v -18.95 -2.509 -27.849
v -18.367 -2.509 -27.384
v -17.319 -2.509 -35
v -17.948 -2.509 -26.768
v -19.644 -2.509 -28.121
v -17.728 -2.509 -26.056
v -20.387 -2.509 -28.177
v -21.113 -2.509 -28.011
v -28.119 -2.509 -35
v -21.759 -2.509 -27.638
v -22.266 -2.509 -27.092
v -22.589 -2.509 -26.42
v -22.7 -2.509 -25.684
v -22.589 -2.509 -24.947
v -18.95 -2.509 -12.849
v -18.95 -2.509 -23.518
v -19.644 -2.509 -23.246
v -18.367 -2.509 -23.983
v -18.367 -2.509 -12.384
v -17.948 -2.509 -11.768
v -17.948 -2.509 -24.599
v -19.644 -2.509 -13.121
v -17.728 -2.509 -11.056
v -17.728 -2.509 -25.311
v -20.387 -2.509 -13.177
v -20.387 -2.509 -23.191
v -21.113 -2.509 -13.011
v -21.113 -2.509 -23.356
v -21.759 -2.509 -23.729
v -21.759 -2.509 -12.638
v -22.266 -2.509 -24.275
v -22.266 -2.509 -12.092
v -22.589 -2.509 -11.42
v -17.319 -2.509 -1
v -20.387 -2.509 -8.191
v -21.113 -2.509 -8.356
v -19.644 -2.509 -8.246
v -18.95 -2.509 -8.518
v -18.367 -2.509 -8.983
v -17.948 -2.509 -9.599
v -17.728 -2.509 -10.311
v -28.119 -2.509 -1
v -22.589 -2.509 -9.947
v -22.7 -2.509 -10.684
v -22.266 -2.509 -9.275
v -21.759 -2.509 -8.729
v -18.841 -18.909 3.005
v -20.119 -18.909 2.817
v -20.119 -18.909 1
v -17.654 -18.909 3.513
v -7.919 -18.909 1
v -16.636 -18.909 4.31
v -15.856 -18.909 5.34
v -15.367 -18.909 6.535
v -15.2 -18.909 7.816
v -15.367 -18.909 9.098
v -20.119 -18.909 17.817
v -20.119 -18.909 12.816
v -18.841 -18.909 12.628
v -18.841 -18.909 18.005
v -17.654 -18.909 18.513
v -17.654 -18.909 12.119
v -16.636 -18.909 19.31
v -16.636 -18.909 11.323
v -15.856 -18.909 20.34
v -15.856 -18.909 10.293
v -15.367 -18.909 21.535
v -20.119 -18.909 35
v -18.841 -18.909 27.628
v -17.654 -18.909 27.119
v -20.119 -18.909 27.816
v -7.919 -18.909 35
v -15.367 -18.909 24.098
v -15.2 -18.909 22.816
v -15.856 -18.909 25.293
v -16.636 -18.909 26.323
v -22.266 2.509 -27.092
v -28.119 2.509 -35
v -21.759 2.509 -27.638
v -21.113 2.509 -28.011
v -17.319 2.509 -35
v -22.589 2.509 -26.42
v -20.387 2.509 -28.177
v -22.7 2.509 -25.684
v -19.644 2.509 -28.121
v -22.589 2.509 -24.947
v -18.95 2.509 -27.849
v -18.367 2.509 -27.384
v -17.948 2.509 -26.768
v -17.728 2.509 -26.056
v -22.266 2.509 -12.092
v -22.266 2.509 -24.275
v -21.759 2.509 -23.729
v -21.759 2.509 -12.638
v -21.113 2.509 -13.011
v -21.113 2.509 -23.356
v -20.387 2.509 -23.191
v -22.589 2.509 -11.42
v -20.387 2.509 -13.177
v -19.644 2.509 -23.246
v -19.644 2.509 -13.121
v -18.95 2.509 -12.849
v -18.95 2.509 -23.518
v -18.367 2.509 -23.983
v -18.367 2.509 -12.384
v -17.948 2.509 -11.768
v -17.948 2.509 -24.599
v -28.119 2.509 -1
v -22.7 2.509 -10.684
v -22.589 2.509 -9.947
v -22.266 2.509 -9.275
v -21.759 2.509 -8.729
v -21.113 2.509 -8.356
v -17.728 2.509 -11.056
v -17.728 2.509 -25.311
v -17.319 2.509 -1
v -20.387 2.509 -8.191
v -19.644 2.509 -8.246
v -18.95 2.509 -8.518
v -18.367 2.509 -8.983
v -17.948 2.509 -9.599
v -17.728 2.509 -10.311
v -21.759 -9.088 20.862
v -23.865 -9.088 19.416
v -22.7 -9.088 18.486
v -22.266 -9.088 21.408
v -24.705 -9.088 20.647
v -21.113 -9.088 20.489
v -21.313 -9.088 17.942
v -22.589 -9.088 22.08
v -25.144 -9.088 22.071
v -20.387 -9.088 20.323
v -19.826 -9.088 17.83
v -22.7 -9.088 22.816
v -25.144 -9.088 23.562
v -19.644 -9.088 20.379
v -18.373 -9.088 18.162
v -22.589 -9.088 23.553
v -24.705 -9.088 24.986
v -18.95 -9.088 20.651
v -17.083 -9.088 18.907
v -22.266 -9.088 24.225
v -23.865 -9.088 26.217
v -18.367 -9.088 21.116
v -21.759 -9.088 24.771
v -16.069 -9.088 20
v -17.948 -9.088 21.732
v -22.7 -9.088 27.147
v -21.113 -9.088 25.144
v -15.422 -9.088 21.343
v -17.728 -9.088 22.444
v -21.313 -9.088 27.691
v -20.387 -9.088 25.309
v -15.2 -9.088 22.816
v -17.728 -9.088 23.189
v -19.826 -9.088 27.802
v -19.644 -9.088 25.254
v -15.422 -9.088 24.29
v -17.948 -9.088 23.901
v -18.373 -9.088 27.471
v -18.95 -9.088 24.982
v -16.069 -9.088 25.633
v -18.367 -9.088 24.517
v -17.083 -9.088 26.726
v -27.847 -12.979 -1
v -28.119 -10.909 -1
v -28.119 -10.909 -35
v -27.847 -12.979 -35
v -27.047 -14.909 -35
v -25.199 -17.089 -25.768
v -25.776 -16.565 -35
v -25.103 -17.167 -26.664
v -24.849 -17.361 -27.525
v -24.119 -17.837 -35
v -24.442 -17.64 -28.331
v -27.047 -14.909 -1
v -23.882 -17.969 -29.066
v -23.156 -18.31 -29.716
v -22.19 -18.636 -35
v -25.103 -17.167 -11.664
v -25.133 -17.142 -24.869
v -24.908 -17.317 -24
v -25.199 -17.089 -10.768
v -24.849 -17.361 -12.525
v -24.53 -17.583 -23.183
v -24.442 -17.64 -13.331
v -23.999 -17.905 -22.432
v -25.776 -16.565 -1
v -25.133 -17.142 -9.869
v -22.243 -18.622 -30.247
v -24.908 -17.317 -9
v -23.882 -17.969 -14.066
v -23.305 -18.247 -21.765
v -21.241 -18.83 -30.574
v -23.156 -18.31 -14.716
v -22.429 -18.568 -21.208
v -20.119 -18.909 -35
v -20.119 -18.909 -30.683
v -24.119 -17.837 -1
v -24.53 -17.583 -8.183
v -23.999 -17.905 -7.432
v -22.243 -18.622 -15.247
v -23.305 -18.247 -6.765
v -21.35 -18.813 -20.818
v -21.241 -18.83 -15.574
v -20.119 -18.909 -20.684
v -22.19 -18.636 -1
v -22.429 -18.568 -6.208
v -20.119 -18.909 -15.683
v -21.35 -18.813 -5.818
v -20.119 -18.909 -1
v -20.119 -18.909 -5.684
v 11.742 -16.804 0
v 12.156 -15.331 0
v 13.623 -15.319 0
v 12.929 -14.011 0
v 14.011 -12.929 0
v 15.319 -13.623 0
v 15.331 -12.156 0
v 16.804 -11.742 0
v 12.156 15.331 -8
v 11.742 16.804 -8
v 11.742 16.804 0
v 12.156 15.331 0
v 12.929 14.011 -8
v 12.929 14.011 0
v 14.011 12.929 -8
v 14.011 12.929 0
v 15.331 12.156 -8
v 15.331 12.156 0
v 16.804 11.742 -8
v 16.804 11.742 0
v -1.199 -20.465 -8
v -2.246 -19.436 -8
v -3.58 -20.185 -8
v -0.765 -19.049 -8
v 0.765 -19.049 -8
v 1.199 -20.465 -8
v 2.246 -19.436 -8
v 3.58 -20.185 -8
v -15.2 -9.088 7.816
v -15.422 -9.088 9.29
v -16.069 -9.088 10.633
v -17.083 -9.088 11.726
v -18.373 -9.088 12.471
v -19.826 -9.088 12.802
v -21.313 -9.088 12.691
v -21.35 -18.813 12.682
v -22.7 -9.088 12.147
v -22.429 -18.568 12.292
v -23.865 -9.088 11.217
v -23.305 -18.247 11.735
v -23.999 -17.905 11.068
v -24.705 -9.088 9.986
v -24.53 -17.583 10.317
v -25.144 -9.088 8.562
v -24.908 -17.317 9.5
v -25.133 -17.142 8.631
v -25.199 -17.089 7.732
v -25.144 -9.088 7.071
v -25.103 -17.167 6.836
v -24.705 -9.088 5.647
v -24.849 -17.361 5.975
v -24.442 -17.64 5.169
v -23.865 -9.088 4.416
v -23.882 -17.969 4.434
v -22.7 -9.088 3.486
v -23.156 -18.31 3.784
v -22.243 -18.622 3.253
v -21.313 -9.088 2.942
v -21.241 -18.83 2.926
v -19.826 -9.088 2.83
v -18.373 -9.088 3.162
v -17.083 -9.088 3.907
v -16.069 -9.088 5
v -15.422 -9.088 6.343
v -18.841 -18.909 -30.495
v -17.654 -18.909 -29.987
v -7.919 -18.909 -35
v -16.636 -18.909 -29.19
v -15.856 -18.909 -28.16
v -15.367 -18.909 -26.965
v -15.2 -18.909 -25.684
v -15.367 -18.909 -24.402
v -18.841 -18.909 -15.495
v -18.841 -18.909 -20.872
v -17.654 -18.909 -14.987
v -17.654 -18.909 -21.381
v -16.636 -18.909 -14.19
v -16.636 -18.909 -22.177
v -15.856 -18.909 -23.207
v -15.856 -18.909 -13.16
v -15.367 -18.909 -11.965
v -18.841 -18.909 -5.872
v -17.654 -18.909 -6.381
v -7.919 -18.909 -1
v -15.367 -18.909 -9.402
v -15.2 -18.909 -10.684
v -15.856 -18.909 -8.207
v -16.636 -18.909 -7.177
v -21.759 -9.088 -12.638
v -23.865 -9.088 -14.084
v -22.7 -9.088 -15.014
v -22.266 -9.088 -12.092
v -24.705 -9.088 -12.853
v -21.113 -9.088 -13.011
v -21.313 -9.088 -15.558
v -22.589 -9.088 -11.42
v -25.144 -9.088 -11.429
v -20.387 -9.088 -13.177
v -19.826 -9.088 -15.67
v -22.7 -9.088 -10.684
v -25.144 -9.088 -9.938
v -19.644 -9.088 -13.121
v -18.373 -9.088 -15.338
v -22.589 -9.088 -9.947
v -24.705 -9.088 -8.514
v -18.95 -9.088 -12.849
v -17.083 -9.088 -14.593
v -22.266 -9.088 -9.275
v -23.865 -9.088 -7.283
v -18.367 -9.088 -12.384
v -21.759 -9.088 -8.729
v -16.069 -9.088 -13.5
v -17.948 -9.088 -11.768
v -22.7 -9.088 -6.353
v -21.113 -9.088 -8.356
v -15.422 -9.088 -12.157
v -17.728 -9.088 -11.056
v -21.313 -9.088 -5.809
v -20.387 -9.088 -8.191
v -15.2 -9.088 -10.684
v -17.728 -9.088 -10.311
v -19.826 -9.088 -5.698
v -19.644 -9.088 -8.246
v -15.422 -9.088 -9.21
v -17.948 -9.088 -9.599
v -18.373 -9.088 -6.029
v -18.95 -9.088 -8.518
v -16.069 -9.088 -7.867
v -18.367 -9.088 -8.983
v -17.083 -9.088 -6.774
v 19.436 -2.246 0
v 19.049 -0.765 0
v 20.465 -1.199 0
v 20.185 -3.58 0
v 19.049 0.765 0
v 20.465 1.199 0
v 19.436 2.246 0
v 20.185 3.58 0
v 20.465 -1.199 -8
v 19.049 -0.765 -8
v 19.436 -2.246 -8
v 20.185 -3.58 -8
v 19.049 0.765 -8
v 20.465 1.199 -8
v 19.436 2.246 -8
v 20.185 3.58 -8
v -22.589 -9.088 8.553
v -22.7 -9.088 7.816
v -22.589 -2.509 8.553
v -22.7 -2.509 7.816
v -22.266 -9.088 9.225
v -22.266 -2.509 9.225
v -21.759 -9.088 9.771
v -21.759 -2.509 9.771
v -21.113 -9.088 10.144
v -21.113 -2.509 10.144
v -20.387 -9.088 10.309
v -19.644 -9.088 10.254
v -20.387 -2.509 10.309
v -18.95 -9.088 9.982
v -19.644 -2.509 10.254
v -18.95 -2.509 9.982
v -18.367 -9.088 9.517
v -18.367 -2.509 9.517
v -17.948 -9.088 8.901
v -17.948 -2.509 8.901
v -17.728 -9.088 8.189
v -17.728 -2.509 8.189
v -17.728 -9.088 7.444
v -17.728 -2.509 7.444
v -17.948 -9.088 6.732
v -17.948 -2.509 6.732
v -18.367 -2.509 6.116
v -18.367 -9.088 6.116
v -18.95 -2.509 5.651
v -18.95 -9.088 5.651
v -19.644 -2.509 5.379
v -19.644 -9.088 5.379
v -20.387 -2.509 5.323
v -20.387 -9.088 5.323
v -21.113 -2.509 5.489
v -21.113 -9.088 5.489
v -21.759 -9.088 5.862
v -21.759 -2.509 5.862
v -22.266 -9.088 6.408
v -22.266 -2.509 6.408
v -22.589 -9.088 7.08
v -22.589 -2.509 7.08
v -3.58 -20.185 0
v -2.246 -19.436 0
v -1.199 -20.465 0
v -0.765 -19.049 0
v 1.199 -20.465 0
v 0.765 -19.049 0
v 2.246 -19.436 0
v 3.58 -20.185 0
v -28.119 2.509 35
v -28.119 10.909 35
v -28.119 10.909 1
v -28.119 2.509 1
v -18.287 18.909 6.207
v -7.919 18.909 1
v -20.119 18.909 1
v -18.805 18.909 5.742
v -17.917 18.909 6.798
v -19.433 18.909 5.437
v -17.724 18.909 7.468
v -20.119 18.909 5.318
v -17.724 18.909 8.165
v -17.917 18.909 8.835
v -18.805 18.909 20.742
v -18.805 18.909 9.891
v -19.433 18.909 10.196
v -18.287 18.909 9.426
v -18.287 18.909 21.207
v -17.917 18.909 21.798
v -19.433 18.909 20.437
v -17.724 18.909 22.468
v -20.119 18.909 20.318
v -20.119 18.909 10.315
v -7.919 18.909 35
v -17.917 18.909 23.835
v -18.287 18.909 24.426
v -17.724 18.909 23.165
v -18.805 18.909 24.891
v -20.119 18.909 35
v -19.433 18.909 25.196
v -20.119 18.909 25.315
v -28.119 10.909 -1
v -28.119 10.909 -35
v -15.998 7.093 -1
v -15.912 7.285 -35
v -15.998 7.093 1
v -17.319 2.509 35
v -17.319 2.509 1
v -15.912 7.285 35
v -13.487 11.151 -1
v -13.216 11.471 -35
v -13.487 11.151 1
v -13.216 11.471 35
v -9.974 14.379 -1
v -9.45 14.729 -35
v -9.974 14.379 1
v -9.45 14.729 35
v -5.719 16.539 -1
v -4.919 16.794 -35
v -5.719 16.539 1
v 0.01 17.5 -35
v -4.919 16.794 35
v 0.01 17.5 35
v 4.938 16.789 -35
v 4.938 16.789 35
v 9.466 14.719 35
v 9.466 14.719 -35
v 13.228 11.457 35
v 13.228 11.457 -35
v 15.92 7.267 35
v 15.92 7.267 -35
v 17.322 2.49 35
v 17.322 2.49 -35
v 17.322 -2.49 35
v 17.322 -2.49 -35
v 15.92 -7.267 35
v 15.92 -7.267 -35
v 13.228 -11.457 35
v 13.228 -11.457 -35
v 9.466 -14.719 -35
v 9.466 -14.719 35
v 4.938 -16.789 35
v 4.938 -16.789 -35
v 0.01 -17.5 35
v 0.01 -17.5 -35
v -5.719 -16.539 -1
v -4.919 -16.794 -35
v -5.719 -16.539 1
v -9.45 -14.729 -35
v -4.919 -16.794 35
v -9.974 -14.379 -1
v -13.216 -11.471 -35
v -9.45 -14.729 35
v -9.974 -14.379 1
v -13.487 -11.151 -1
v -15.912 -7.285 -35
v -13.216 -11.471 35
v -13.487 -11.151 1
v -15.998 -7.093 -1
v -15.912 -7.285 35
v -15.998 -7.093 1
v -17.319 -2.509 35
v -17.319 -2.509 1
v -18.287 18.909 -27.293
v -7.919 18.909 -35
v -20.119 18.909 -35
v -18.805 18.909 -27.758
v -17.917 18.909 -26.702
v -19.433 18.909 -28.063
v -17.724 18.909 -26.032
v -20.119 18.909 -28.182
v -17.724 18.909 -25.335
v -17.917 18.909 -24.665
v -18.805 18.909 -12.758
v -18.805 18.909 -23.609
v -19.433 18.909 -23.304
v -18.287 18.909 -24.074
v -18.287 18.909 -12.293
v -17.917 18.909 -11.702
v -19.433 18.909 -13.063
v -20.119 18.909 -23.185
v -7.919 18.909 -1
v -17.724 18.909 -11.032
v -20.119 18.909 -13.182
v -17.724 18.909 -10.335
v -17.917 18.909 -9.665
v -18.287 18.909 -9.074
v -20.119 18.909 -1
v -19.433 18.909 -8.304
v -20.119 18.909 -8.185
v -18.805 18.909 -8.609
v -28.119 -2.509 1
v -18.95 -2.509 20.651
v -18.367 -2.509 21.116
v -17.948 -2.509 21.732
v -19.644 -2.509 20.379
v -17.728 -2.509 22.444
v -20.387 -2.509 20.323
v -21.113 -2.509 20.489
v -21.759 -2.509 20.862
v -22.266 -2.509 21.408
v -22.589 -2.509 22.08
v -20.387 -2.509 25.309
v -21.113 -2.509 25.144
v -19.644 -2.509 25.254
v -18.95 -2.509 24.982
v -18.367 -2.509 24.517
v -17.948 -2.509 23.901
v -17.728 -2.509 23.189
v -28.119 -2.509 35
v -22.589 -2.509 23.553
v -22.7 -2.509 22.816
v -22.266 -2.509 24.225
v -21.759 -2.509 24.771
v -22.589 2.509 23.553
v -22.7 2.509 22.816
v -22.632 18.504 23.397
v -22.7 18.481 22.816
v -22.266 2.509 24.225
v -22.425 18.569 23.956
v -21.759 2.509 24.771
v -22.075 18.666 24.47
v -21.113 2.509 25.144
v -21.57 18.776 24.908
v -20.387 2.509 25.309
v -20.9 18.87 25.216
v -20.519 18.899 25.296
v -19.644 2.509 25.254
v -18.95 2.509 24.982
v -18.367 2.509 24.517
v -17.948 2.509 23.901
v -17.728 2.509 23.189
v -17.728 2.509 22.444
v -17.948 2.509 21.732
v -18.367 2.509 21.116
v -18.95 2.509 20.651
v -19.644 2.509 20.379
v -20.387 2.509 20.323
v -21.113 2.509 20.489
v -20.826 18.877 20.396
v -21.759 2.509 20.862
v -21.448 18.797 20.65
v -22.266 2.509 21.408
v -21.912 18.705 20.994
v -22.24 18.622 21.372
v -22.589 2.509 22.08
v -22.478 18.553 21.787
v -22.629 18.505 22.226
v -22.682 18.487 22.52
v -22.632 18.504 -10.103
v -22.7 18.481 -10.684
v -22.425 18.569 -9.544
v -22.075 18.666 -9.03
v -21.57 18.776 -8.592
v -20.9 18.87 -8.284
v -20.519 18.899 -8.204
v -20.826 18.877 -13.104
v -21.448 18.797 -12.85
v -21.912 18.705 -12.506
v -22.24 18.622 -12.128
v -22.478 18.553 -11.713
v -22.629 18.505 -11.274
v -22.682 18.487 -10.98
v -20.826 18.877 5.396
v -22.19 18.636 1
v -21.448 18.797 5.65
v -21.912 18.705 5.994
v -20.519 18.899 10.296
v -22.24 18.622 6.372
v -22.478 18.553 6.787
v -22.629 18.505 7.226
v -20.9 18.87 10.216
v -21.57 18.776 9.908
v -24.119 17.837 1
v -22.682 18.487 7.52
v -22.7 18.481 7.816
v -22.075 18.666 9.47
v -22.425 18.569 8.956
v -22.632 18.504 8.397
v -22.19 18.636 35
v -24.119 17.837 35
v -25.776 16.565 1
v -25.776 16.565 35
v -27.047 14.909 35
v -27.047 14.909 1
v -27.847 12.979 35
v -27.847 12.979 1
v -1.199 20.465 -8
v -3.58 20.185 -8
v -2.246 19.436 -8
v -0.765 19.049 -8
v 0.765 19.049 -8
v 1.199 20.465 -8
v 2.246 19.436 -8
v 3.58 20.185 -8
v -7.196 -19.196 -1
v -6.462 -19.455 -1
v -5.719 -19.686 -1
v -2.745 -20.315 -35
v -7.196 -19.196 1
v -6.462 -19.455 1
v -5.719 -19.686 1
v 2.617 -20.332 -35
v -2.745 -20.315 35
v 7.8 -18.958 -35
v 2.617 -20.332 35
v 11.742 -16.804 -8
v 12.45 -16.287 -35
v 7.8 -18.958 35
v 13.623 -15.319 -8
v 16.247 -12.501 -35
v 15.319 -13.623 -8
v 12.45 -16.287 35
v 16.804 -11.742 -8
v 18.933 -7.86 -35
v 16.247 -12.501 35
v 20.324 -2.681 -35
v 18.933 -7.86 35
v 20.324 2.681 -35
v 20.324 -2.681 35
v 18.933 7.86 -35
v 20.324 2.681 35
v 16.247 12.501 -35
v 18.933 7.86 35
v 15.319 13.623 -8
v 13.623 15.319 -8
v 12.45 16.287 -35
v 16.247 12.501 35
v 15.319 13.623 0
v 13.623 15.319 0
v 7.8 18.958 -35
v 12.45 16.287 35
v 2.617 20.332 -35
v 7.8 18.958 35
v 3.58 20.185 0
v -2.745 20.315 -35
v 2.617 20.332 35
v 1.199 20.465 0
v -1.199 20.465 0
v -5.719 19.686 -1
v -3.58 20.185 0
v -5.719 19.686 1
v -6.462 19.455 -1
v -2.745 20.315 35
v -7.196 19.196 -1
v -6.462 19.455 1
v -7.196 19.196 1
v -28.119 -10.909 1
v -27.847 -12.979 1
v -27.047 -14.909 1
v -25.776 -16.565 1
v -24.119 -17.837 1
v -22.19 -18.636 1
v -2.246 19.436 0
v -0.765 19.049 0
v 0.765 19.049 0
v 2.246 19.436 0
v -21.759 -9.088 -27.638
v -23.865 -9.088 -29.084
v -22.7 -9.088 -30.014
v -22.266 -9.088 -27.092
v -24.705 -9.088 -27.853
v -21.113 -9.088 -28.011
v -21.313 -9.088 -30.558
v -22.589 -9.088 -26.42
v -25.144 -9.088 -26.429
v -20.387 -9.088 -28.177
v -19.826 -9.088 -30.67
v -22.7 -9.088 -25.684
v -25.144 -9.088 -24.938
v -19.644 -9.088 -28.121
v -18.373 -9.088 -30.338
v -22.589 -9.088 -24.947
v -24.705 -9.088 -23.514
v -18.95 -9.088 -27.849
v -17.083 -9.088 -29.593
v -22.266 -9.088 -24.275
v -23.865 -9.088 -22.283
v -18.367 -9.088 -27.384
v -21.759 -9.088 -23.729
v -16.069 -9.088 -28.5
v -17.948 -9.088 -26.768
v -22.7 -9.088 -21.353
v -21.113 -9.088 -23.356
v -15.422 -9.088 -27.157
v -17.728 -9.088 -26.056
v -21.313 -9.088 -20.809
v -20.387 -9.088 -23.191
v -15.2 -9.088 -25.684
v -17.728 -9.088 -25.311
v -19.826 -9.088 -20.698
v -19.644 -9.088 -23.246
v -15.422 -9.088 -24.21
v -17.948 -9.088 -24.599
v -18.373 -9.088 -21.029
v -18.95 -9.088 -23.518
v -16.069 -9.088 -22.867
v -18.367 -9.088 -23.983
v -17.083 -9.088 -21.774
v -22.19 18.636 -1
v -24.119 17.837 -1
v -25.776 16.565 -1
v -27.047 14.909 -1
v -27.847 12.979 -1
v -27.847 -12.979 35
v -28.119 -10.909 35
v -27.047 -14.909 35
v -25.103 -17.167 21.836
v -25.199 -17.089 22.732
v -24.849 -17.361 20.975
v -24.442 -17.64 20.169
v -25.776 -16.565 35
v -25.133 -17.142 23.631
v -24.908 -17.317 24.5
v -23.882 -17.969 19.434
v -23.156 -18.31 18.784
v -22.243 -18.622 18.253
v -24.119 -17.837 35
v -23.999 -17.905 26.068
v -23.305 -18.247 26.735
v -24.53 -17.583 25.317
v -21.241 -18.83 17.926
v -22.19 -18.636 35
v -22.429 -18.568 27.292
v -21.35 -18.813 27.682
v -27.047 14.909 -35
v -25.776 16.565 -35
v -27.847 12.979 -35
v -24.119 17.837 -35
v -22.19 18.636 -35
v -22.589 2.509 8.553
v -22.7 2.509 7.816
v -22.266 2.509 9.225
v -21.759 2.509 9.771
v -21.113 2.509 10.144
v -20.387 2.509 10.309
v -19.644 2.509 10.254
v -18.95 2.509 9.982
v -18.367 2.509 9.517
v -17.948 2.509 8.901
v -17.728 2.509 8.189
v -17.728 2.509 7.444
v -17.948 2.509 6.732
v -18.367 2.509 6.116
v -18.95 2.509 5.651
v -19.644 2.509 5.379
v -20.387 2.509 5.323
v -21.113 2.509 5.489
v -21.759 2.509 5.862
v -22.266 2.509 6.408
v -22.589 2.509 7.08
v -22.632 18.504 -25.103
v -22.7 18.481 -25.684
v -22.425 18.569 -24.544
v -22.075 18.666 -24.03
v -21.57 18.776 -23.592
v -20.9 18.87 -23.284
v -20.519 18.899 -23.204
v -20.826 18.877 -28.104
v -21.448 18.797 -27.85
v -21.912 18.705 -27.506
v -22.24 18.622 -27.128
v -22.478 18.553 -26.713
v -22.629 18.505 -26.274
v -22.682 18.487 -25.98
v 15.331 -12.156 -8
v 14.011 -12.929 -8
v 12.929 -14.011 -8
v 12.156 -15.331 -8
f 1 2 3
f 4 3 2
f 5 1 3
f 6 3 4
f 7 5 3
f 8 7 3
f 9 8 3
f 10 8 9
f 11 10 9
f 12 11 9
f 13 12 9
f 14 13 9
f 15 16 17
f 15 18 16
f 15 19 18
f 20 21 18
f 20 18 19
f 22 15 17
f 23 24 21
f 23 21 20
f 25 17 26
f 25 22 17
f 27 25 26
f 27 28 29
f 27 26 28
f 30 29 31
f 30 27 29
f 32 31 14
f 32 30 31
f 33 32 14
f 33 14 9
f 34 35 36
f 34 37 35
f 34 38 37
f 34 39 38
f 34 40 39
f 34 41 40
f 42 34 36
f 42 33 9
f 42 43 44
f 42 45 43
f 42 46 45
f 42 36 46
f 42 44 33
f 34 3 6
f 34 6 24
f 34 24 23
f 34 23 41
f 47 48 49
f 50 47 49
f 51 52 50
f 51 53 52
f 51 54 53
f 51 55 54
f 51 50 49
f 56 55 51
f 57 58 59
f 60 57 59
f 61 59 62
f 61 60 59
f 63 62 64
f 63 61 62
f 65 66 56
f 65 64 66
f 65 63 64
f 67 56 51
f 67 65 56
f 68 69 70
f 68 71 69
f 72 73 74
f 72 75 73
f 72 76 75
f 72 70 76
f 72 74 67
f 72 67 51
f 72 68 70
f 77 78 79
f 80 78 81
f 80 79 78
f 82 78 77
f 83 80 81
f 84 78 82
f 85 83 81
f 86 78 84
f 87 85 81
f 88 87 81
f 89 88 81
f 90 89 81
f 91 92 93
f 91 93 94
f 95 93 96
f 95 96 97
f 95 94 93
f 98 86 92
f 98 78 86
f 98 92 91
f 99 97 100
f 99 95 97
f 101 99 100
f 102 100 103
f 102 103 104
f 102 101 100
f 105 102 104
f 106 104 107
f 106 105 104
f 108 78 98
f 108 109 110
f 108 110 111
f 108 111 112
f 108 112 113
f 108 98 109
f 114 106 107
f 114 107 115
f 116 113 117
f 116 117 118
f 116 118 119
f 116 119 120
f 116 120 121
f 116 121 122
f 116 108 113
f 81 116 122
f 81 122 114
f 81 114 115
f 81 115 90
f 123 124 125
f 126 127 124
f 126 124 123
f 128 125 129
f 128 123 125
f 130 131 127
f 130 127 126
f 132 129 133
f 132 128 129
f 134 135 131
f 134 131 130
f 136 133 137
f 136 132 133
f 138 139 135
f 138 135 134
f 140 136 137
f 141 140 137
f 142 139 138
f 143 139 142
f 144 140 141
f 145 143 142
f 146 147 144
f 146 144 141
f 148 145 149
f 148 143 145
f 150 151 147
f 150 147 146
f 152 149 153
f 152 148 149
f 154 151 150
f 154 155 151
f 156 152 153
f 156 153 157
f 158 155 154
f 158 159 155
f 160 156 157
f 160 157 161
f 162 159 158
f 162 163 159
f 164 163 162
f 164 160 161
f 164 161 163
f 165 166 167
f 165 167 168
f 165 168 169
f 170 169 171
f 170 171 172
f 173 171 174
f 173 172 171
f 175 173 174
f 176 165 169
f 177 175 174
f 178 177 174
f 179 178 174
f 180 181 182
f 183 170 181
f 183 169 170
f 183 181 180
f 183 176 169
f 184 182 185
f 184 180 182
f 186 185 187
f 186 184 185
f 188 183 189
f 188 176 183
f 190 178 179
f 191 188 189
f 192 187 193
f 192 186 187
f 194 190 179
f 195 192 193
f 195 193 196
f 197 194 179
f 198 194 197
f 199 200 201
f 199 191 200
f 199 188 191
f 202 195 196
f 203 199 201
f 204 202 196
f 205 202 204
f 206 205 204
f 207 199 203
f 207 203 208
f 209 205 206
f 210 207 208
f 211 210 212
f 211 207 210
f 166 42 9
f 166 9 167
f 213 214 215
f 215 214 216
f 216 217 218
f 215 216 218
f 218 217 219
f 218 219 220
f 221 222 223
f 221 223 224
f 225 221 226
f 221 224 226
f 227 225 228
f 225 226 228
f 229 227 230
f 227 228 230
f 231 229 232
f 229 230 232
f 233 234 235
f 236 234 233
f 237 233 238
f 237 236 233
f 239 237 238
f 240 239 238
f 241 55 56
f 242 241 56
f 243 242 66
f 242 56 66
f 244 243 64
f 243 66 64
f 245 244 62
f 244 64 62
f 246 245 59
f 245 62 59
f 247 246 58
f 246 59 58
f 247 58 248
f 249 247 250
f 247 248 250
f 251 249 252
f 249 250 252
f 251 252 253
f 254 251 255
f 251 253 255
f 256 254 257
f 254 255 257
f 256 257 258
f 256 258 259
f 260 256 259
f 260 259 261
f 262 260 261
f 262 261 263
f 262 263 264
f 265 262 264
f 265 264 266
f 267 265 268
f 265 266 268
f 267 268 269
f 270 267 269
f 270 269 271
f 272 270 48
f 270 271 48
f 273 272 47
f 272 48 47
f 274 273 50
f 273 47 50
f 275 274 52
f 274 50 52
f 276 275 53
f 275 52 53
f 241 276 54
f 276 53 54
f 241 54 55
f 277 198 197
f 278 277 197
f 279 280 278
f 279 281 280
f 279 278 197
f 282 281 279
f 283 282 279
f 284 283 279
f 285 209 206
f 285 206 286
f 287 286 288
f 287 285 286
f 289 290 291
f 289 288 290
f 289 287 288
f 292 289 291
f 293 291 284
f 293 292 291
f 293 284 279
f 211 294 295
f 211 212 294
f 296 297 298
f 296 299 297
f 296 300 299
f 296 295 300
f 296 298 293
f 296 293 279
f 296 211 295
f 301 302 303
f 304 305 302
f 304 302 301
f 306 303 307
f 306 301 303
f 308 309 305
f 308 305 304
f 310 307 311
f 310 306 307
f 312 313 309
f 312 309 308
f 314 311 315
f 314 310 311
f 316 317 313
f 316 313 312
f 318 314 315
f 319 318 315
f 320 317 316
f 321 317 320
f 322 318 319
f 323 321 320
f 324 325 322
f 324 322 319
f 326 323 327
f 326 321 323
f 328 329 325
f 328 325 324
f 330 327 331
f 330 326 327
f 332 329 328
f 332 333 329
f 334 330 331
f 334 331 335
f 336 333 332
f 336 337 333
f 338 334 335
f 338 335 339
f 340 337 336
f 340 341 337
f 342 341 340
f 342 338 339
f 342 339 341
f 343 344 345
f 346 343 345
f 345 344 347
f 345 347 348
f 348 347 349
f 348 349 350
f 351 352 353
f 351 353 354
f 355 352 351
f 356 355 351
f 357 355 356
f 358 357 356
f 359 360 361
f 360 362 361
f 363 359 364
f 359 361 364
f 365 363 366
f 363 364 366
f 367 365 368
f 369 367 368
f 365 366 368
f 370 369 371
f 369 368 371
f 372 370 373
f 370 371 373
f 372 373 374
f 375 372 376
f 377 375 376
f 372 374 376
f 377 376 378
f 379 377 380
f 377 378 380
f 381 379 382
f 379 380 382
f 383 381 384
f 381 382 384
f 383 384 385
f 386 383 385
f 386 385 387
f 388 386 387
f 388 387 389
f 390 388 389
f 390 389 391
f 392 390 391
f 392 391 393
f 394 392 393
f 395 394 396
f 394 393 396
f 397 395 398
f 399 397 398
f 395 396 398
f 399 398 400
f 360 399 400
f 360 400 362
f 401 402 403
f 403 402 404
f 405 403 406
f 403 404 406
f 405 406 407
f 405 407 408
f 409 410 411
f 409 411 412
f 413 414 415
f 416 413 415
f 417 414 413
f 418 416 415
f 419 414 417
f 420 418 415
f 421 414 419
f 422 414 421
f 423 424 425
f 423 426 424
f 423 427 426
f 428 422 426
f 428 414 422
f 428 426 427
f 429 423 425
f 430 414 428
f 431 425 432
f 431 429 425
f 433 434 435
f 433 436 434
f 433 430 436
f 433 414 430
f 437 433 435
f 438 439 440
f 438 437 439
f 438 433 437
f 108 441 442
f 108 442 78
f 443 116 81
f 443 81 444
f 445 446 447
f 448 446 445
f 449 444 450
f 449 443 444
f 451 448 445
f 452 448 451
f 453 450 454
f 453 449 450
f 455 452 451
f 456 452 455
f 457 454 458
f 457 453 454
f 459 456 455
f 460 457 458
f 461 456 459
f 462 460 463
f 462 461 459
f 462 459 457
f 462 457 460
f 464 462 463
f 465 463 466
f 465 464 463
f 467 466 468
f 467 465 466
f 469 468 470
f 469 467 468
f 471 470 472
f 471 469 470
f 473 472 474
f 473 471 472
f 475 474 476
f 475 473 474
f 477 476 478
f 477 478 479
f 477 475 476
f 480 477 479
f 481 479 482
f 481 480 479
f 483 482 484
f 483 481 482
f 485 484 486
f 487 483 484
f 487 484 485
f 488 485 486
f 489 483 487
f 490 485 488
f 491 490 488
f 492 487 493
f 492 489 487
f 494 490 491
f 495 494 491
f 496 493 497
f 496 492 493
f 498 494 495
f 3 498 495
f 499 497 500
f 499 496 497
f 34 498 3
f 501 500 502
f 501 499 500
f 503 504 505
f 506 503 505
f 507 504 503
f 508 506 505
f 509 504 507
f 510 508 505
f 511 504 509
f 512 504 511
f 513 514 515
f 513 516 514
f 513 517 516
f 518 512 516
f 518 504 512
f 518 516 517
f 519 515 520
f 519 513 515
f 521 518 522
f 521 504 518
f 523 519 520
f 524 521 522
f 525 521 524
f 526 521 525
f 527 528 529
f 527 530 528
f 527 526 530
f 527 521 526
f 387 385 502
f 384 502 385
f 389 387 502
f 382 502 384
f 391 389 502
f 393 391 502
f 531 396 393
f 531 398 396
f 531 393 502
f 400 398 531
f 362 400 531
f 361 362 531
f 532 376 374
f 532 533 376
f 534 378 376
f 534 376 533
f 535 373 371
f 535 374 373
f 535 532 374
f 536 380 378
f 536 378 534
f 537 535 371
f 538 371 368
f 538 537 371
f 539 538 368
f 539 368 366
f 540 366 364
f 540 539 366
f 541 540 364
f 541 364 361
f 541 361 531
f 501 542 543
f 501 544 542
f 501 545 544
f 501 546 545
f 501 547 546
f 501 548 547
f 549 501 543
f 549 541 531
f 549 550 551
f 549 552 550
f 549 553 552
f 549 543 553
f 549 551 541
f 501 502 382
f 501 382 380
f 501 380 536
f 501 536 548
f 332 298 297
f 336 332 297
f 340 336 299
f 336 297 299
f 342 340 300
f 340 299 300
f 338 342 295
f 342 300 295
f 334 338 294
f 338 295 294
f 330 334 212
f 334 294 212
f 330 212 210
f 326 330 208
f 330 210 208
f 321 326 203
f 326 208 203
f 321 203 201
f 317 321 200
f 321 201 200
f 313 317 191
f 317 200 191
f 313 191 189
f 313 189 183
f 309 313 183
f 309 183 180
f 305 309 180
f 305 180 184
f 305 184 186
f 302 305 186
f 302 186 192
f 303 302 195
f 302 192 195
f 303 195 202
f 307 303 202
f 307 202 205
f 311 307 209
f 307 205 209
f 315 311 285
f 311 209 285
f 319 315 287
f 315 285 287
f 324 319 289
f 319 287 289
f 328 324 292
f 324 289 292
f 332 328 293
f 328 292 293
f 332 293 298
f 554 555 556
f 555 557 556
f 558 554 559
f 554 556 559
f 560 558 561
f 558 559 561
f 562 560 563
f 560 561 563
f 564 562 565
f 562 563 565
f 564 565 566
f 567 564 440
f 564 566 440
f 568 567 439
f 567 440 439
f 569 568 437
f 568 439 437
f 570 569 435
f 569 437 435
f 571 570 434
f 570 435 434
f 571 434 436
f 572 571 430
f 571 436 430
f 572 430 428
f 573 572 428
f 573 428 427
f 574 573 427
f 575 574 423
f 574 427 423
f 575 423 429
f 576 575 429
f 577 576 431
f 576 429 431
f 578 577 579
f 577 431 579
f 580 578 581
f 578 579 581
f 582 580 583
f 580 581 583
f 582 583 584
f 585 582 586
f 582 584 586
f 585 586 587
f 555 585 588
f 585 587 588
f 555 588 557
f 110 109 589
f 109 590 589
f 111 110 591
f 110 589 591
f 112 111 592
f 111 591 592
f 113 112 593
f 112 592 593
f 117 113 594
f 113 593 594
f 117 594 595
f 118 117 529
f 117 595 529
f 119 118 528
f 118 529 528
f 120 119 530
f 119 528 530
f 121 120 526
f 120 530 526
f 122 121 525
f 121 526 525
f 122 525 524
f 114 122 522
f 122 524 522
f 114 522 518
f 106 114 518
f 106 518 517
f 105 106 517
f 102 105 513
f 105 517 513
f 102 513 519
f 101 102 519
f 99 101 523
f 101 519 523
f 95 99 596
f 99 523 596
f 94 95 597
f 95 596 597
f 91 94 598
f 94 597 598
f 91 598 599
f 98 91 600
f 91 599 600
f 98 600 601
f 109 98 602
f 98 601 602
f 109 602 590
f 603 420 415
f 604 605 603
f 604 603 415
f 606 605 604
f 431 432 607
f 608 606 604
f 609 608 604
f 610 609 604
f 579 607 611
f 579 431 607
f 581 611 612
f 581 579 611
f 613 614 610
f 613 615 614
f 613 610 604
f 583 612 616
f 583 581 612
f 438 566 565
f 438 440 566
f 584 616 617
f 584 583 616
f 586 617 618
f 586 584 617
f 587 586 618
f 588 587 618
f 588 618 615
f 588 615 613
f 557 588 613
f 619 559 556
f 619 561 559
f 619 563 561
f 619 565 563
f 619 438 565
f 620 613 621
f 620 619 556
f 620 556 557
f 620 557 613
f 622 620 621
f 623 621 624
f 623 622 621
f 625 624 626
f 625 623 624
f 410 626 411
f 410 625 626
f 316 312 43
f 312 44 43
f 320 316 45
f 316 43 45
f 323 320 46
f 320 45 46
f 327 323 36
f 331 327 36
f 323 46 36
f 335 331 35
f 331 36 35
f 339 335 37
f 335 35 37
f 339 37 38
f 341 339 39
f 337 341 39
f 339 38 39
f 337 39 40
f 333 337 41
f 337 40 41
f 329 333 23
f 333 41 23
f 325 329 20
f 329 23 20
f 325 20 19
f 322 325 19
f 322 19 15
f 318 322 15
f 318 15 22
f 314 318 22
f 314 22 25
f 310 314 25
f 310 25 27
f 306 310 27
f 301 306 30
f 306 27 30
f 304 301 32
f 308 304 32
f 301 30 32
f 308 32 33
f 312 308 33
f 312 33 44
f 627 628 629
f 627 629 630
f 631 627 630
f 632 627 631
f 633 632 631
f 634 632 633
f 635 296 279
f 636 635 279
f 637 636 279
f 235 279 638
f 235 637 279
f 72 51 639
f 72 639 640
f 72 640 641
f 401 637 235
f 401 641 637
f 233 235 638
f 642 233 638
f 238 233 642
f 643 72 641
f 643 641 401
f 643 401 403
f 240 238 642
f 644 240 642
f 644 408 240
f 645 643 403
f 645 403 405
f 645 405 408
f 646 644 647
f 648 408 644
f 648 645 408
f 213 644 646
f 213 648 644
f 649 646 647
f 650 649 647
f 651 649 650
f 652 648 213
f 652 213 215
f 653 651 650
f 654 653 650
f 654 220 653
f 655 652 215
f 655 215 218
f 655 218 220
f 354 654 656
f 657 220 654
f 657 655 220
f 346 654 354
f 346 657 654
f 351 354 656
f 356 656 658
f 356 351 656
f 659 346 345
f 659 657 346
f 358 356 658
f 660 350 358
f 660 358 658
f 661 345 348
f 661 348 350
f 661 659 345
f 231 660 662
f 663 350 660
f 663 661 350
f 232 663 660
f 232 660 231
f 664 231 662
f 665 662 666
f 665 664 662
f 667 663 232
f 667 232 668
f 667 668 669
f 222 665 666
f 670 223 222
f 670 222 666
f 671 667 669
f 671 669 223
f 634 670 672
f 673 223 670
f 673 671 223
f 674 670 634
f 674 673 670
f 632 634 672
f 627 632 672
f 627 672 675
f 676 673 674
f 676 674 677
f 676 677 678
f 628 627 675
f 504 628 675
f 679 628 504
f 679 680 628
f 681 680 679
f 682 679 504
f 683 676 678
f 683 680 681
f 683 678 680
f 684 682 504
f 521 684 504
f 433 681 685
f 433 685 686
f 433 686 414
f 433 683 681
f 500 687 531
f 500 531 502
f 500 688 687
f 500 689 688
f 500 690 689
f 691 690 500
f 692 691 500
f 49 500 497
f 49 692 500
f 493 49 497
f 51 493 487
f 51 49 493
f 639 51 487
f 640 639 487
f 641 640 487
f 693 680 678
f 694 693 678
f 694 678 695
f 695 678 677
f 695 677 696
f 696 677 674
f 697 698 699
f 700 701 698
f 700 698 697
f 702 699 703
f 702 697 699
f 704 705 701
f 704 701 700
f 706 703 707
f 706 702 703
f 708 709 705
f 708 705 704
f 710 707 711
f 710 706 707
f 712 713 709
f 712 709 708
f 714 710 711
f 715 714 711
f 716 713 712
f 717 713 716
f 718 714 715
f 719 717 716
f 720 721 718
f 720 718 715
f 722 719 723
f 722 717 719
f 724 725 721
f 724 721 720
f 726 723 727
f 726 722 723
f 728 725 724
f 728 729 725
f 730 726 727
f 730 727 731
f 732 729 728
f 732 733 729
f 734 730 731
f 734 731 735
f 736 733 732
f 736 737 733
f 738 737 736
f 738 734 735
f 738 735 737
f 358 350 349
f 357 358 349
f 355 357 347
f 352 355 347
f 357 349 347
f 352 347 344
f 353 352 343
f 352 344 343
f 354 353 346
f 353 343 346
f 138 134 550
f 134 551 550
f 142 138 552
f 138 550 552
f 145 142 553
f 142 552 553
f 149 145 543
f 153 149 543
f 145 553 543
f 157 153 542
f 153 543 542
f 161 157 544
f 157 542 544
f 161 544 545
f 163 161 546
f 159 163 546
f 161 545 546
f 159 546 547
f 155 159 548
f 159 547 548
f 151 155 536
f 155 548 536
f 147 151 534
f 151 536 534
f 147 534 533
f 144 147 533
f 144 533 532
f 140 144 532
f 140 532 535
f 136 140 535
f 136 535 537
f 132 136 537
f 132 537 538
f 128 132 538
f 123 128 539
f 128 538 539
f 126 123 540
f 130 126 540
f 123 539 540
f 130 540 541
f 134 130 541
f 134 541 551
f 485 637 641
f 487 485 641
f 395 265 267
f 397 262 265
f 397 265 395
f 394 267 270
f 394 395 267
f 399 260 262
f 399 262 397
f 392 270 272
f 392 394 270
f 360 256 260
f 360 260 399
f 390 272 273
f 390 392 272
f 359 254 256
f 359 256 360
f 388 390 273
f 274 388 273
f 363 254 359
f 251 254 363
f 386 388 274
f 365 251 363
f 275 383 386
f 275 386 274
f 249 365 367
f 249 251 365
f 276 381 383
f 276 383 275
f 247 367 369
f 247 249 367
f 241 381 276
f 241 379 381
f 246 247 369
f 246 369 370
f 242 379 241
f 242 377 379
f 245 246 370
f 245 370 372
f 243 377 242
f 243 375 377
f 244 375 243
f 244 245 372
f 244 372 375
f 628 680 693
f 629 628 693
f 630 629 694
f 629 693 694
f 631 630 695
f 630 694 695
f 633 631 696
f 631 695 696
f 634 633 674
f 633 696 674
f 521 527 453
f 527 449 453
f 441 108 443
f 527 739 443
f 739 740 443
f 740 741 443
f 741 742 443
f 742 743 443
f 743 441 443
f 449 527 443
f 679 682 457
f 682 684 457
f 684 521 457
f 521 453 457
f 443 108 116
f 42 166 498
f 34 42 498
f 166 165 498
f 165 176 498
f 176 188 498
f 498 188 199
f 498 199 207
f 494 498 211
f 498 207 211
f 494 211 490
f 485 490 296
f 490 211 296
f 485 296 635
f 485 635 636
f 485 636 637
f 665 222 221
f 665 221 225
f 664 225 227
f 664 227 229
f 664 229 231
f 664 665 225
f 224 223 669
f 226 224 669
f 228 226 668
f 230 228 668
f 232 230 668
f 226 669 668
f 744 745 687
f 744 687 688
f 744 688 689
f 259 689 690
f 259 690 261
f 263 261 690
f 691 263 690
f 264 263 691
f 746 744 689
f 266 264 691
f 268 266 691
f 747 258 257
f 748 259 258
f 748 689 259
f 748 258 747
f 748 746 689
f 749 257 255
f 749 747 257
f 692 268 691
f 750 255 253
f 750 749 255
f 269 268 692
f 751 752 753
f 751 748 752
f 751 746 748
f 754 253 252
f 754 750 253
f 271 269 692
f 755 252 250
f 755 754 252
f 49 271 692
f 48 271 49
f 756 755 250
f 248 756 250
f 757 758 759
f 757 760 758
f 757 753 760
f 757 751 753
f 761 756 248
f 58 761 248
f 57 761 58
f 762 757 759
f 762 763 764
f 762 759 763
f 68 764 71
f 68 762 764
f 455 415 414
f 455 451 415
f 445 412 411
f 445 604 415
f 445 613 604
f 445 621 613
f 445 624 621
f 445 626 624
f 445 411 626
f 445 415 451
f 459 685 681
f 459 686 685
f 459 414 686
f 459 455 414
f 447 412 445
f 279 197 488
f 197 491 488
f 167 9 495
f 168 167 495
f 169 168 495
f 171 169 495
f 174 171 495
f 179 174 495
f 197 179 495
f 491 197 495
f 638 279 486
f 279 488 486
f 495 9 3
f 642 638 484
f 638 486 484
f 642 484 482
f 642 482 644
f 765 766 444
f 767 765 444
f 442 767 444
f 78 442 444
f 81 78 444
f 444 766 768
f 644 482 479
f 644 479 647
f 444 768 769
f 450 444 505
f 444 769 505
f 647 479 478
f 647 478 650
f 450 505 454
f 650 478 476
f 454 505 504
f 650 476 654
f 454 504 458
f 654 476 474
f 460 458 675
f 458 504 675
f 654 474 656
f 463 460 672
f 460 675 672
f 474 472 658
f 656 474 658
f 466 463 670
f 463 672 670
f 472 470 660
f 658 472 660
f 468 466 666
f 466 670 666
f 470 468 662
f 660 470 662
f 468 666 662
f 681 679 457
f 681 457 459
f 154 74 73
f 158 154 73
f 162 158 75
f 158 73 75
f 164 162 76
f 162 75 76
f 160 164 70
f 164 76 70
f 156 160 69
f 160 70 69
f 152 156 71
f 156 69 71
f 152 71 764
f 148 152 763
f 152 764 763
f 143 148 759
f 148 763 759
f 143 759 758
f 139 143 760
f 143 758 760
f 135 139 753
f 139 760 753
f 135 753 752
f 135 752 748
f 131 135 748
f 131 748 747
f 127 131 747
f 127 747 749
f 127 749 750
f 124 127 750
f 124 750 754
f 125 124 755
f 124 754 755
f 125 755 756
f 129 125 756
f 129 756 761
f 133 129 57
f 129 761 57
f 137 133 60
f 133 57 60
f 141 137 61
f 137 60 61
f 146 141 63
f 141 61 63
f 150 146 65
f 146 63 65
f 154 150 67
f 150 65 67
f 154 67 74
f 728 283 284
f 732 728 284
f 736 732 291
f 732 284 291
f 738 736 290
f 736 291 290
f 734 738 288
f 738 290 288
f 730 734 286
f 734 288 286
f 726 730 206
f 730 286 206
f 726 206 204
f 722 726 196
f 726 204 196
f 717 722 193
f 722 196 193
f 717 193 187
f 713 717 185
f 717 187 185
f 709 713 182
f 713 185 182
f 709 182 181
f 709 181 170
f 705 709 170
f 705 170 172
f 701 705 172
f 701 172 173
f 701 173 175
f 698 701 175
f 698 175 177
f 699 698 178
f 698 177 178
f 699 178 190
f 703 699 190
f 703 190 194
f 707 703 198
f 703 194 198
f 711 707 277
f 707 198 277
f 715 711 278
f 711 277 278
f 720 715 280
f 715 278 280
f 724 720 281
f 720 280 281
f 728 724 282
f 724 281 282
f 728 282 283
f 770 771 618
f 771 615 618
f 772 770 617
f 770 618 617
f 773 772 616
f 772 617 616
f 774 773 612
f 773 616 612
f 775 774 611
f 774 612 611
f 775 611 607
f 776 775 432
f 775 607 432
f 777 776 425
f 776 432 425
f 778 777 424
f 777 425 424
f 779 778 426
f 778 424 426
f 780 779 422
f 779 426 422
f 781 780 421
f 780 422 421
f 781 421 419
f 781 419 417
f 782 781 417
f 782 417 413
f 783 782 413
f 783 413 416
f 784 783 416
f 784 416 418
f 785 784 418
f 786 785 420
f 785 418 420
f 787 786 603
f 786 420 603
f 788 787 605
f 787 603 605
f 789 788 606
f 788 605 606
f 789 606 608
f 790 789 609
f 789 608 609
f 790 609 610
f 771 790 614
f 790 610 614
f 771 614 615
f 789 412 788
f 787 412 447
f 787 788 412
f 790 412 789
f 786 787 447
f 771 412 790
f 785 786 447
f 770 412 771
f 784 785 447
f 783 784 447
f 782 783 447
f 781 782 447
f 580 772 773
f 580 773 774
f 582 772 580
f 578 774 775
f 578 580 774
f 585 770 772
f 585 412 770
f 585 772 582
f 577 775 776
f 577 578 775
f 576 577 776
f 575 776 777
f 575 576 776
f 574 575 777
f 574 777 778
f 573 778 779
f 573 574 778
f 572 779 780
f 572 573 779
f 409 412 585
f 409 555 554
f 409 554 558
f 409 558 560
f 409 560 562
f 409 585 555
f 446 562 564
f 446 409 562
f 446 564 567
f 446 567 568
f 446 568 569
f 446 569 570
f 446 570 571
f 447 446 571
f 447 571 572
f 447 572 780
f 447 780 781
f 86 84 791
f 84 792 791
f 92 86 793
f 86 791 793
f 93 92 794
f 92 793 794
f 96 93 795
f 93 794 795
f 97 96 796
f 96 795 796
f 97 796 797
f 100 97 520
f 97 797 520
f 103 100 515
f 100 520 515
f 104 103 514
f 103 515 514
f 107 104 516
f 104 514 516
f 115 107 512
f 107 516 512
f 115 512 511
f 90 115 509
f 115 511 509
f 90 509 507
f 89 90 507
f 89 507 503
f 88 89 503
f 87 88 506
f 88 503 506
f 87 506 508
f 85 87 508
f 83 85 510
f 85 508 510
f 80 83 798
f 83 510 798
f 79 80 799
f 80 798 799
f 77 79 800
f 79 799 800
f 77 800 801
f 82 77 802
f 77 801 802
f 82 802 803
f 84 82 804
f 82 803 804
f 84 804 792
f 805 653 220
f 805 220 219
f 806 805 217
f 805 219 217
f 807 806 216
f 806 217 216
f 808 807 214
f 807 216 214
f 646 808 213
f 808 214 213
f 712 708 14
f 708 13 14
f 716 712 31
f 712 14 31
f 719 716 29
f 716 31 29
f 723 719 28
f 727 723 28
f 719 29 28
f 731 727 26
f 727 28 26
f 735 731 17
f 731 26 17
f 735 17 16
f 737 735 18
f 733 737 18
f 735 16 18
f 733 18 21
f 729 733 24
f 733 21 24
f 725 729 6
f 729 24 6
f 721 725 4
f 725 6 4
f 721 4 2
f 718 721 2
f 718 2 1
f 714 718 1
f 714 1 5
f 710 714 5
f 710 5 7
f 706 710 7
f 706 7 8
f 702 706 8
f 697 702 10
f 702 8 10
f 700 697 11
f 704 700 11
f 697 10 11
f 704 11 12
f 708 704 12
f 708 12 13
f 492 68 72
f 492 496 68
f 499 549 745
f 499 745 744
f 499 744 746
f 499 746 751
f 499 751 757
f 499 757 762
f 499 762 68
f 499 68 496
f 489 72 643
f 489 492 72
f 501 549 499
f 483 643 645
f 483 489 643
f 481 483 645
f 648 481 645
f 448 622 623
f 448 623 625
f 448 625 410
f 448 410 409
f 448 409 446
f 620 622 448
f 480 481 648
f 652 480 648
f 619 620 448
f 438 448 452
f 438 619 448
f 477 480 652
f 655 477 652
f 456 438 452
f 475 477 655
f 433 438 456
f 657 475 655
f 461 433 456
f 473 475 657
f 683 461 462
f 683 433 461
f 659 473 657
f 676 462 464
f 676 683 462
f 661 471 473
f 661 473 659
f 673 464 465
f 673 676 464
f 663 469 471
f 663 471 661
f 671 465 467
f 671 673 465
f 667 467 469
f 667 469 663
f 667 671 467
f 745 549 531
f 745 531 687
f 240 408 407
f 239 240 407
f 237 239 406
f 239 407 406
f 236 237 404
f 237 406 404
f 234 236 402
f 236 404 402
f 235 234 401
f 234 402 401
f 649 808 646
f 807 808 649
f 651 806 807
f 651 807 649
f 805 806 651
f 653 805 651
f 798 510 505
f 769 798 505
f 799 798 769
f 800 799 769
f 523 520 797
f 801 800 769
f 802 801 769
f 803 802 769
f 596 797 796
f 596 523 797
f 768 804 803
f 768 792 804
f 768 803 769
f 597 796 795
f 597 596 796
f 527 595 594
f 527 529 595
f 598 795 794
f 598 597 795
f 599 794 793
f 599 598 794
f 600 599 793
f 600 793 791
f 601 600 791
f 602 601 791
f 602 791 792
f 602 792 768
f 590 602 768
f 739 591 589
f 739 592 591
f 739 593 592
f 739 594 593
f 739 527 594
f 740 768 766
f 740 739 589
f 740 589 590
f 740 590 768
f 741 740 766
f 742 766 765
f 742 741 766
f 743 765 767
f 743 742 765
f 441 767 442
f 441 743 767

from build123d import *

# Parameters (mm, degrees)
F1_DEPTH       = 35
F3_D           = 5
F3_START       = 1.8205079
F3_CBORE_D     = 10
F3_CBORE_DEPTH = 8
F4_W           = 22.4
F4_H           = 2
F5_DEPTH       = 27.5
F6_R           = 6
F7_DEPTH       = 8


with BuildPart() as f1:
    # F0 (on Top) → F1 (new body, symmetric)
    with BuildSketch(Plane.XY):
        with BuildLine():
            ThreePointArc((-17.3192642082, 2.5086026559), (17.5, 0), (-17.3192642082, -2.5086026559))
            Line((-17.3192642082, -2.5086026559), (-28.1192642082, -2.5086026559))
            Line((-28.1192642082, -2.5086026559), (-28.1192642082, -10.9086026559))
            ThreePointArc((-28.1192642082, -10.9086026559), (-25.7761184577, -16.5654569054), (-20.1192642082, -18.9086026559))
            Line((-20.1192642082, -18.9086026559), (-7.9192642082, -18.9086026559))
            ThreePointArc((-7.9192642082, -18.9086026559), (20.5, 0), (-7.9192642082, 18.9086026559))
            Line((-7.9192642082, 18.9086026559), (-20.1192642082, 18.9086026559))
            ThreePointArc((-20.1192642082, 18.9086026559), (-25.7761184577, 16.5654569054), (-28.1192642082, 10.9086026559))
            Line((-28.1192642082, 10.9086026559), (-28.1192642082, 2.5086026559))
            Line((-28.1192642082, 2.5086026559), (-17.3192642082, 2.5086026559))
        make_face()
    extrude(amount=F1_DEPTH, both=True)

    # F3 (through all)
    # its depths count from where the whole tool has entered the part; down to there all is cleared
    with Locations(Plane.XZ.offset(18.9086026559).offset(-F3_START)):
        with Locations((-20.2, -25.683545606), (-20.2, -10.683545606), (-20.2, 7.816454394), (-20.2, 22.816454394)):
            CounterBoreHole(F3_D / 2, F3_CBORE_D / 2, F3_CBORE_DEPTH)

    # F4 (on Front) → F5 (cut, symmetric)
    with BuildSketch(Plane.XZ):
        with Locations((-16.9192642082, 0)):
            Rectangle(F4_W, F4_H)
    extrude(amount=F5_DEPTH, both=True, mode=Mode.SUBTRACT)

    # F6 (on Top) → F7 (cut)
    with BuildSketch(Plane.XY):
        with Locations((0, -25)):
            Circle(F6_R)
        with Locations((17.6776695297, -17.6776695297)):
            Circle(F6_R)
        with Locations((25, 0)):
            Circle(F6_R)
        with Locations((17.6776695297, 17.6776695297)):
            Circle(F6_R)
        with Locations((0, 25)):
            Circle(F6_R)
    extrude(amount=-F7_DEPTH, mode=Mode.SUBTRACT)


solid = f1.part
